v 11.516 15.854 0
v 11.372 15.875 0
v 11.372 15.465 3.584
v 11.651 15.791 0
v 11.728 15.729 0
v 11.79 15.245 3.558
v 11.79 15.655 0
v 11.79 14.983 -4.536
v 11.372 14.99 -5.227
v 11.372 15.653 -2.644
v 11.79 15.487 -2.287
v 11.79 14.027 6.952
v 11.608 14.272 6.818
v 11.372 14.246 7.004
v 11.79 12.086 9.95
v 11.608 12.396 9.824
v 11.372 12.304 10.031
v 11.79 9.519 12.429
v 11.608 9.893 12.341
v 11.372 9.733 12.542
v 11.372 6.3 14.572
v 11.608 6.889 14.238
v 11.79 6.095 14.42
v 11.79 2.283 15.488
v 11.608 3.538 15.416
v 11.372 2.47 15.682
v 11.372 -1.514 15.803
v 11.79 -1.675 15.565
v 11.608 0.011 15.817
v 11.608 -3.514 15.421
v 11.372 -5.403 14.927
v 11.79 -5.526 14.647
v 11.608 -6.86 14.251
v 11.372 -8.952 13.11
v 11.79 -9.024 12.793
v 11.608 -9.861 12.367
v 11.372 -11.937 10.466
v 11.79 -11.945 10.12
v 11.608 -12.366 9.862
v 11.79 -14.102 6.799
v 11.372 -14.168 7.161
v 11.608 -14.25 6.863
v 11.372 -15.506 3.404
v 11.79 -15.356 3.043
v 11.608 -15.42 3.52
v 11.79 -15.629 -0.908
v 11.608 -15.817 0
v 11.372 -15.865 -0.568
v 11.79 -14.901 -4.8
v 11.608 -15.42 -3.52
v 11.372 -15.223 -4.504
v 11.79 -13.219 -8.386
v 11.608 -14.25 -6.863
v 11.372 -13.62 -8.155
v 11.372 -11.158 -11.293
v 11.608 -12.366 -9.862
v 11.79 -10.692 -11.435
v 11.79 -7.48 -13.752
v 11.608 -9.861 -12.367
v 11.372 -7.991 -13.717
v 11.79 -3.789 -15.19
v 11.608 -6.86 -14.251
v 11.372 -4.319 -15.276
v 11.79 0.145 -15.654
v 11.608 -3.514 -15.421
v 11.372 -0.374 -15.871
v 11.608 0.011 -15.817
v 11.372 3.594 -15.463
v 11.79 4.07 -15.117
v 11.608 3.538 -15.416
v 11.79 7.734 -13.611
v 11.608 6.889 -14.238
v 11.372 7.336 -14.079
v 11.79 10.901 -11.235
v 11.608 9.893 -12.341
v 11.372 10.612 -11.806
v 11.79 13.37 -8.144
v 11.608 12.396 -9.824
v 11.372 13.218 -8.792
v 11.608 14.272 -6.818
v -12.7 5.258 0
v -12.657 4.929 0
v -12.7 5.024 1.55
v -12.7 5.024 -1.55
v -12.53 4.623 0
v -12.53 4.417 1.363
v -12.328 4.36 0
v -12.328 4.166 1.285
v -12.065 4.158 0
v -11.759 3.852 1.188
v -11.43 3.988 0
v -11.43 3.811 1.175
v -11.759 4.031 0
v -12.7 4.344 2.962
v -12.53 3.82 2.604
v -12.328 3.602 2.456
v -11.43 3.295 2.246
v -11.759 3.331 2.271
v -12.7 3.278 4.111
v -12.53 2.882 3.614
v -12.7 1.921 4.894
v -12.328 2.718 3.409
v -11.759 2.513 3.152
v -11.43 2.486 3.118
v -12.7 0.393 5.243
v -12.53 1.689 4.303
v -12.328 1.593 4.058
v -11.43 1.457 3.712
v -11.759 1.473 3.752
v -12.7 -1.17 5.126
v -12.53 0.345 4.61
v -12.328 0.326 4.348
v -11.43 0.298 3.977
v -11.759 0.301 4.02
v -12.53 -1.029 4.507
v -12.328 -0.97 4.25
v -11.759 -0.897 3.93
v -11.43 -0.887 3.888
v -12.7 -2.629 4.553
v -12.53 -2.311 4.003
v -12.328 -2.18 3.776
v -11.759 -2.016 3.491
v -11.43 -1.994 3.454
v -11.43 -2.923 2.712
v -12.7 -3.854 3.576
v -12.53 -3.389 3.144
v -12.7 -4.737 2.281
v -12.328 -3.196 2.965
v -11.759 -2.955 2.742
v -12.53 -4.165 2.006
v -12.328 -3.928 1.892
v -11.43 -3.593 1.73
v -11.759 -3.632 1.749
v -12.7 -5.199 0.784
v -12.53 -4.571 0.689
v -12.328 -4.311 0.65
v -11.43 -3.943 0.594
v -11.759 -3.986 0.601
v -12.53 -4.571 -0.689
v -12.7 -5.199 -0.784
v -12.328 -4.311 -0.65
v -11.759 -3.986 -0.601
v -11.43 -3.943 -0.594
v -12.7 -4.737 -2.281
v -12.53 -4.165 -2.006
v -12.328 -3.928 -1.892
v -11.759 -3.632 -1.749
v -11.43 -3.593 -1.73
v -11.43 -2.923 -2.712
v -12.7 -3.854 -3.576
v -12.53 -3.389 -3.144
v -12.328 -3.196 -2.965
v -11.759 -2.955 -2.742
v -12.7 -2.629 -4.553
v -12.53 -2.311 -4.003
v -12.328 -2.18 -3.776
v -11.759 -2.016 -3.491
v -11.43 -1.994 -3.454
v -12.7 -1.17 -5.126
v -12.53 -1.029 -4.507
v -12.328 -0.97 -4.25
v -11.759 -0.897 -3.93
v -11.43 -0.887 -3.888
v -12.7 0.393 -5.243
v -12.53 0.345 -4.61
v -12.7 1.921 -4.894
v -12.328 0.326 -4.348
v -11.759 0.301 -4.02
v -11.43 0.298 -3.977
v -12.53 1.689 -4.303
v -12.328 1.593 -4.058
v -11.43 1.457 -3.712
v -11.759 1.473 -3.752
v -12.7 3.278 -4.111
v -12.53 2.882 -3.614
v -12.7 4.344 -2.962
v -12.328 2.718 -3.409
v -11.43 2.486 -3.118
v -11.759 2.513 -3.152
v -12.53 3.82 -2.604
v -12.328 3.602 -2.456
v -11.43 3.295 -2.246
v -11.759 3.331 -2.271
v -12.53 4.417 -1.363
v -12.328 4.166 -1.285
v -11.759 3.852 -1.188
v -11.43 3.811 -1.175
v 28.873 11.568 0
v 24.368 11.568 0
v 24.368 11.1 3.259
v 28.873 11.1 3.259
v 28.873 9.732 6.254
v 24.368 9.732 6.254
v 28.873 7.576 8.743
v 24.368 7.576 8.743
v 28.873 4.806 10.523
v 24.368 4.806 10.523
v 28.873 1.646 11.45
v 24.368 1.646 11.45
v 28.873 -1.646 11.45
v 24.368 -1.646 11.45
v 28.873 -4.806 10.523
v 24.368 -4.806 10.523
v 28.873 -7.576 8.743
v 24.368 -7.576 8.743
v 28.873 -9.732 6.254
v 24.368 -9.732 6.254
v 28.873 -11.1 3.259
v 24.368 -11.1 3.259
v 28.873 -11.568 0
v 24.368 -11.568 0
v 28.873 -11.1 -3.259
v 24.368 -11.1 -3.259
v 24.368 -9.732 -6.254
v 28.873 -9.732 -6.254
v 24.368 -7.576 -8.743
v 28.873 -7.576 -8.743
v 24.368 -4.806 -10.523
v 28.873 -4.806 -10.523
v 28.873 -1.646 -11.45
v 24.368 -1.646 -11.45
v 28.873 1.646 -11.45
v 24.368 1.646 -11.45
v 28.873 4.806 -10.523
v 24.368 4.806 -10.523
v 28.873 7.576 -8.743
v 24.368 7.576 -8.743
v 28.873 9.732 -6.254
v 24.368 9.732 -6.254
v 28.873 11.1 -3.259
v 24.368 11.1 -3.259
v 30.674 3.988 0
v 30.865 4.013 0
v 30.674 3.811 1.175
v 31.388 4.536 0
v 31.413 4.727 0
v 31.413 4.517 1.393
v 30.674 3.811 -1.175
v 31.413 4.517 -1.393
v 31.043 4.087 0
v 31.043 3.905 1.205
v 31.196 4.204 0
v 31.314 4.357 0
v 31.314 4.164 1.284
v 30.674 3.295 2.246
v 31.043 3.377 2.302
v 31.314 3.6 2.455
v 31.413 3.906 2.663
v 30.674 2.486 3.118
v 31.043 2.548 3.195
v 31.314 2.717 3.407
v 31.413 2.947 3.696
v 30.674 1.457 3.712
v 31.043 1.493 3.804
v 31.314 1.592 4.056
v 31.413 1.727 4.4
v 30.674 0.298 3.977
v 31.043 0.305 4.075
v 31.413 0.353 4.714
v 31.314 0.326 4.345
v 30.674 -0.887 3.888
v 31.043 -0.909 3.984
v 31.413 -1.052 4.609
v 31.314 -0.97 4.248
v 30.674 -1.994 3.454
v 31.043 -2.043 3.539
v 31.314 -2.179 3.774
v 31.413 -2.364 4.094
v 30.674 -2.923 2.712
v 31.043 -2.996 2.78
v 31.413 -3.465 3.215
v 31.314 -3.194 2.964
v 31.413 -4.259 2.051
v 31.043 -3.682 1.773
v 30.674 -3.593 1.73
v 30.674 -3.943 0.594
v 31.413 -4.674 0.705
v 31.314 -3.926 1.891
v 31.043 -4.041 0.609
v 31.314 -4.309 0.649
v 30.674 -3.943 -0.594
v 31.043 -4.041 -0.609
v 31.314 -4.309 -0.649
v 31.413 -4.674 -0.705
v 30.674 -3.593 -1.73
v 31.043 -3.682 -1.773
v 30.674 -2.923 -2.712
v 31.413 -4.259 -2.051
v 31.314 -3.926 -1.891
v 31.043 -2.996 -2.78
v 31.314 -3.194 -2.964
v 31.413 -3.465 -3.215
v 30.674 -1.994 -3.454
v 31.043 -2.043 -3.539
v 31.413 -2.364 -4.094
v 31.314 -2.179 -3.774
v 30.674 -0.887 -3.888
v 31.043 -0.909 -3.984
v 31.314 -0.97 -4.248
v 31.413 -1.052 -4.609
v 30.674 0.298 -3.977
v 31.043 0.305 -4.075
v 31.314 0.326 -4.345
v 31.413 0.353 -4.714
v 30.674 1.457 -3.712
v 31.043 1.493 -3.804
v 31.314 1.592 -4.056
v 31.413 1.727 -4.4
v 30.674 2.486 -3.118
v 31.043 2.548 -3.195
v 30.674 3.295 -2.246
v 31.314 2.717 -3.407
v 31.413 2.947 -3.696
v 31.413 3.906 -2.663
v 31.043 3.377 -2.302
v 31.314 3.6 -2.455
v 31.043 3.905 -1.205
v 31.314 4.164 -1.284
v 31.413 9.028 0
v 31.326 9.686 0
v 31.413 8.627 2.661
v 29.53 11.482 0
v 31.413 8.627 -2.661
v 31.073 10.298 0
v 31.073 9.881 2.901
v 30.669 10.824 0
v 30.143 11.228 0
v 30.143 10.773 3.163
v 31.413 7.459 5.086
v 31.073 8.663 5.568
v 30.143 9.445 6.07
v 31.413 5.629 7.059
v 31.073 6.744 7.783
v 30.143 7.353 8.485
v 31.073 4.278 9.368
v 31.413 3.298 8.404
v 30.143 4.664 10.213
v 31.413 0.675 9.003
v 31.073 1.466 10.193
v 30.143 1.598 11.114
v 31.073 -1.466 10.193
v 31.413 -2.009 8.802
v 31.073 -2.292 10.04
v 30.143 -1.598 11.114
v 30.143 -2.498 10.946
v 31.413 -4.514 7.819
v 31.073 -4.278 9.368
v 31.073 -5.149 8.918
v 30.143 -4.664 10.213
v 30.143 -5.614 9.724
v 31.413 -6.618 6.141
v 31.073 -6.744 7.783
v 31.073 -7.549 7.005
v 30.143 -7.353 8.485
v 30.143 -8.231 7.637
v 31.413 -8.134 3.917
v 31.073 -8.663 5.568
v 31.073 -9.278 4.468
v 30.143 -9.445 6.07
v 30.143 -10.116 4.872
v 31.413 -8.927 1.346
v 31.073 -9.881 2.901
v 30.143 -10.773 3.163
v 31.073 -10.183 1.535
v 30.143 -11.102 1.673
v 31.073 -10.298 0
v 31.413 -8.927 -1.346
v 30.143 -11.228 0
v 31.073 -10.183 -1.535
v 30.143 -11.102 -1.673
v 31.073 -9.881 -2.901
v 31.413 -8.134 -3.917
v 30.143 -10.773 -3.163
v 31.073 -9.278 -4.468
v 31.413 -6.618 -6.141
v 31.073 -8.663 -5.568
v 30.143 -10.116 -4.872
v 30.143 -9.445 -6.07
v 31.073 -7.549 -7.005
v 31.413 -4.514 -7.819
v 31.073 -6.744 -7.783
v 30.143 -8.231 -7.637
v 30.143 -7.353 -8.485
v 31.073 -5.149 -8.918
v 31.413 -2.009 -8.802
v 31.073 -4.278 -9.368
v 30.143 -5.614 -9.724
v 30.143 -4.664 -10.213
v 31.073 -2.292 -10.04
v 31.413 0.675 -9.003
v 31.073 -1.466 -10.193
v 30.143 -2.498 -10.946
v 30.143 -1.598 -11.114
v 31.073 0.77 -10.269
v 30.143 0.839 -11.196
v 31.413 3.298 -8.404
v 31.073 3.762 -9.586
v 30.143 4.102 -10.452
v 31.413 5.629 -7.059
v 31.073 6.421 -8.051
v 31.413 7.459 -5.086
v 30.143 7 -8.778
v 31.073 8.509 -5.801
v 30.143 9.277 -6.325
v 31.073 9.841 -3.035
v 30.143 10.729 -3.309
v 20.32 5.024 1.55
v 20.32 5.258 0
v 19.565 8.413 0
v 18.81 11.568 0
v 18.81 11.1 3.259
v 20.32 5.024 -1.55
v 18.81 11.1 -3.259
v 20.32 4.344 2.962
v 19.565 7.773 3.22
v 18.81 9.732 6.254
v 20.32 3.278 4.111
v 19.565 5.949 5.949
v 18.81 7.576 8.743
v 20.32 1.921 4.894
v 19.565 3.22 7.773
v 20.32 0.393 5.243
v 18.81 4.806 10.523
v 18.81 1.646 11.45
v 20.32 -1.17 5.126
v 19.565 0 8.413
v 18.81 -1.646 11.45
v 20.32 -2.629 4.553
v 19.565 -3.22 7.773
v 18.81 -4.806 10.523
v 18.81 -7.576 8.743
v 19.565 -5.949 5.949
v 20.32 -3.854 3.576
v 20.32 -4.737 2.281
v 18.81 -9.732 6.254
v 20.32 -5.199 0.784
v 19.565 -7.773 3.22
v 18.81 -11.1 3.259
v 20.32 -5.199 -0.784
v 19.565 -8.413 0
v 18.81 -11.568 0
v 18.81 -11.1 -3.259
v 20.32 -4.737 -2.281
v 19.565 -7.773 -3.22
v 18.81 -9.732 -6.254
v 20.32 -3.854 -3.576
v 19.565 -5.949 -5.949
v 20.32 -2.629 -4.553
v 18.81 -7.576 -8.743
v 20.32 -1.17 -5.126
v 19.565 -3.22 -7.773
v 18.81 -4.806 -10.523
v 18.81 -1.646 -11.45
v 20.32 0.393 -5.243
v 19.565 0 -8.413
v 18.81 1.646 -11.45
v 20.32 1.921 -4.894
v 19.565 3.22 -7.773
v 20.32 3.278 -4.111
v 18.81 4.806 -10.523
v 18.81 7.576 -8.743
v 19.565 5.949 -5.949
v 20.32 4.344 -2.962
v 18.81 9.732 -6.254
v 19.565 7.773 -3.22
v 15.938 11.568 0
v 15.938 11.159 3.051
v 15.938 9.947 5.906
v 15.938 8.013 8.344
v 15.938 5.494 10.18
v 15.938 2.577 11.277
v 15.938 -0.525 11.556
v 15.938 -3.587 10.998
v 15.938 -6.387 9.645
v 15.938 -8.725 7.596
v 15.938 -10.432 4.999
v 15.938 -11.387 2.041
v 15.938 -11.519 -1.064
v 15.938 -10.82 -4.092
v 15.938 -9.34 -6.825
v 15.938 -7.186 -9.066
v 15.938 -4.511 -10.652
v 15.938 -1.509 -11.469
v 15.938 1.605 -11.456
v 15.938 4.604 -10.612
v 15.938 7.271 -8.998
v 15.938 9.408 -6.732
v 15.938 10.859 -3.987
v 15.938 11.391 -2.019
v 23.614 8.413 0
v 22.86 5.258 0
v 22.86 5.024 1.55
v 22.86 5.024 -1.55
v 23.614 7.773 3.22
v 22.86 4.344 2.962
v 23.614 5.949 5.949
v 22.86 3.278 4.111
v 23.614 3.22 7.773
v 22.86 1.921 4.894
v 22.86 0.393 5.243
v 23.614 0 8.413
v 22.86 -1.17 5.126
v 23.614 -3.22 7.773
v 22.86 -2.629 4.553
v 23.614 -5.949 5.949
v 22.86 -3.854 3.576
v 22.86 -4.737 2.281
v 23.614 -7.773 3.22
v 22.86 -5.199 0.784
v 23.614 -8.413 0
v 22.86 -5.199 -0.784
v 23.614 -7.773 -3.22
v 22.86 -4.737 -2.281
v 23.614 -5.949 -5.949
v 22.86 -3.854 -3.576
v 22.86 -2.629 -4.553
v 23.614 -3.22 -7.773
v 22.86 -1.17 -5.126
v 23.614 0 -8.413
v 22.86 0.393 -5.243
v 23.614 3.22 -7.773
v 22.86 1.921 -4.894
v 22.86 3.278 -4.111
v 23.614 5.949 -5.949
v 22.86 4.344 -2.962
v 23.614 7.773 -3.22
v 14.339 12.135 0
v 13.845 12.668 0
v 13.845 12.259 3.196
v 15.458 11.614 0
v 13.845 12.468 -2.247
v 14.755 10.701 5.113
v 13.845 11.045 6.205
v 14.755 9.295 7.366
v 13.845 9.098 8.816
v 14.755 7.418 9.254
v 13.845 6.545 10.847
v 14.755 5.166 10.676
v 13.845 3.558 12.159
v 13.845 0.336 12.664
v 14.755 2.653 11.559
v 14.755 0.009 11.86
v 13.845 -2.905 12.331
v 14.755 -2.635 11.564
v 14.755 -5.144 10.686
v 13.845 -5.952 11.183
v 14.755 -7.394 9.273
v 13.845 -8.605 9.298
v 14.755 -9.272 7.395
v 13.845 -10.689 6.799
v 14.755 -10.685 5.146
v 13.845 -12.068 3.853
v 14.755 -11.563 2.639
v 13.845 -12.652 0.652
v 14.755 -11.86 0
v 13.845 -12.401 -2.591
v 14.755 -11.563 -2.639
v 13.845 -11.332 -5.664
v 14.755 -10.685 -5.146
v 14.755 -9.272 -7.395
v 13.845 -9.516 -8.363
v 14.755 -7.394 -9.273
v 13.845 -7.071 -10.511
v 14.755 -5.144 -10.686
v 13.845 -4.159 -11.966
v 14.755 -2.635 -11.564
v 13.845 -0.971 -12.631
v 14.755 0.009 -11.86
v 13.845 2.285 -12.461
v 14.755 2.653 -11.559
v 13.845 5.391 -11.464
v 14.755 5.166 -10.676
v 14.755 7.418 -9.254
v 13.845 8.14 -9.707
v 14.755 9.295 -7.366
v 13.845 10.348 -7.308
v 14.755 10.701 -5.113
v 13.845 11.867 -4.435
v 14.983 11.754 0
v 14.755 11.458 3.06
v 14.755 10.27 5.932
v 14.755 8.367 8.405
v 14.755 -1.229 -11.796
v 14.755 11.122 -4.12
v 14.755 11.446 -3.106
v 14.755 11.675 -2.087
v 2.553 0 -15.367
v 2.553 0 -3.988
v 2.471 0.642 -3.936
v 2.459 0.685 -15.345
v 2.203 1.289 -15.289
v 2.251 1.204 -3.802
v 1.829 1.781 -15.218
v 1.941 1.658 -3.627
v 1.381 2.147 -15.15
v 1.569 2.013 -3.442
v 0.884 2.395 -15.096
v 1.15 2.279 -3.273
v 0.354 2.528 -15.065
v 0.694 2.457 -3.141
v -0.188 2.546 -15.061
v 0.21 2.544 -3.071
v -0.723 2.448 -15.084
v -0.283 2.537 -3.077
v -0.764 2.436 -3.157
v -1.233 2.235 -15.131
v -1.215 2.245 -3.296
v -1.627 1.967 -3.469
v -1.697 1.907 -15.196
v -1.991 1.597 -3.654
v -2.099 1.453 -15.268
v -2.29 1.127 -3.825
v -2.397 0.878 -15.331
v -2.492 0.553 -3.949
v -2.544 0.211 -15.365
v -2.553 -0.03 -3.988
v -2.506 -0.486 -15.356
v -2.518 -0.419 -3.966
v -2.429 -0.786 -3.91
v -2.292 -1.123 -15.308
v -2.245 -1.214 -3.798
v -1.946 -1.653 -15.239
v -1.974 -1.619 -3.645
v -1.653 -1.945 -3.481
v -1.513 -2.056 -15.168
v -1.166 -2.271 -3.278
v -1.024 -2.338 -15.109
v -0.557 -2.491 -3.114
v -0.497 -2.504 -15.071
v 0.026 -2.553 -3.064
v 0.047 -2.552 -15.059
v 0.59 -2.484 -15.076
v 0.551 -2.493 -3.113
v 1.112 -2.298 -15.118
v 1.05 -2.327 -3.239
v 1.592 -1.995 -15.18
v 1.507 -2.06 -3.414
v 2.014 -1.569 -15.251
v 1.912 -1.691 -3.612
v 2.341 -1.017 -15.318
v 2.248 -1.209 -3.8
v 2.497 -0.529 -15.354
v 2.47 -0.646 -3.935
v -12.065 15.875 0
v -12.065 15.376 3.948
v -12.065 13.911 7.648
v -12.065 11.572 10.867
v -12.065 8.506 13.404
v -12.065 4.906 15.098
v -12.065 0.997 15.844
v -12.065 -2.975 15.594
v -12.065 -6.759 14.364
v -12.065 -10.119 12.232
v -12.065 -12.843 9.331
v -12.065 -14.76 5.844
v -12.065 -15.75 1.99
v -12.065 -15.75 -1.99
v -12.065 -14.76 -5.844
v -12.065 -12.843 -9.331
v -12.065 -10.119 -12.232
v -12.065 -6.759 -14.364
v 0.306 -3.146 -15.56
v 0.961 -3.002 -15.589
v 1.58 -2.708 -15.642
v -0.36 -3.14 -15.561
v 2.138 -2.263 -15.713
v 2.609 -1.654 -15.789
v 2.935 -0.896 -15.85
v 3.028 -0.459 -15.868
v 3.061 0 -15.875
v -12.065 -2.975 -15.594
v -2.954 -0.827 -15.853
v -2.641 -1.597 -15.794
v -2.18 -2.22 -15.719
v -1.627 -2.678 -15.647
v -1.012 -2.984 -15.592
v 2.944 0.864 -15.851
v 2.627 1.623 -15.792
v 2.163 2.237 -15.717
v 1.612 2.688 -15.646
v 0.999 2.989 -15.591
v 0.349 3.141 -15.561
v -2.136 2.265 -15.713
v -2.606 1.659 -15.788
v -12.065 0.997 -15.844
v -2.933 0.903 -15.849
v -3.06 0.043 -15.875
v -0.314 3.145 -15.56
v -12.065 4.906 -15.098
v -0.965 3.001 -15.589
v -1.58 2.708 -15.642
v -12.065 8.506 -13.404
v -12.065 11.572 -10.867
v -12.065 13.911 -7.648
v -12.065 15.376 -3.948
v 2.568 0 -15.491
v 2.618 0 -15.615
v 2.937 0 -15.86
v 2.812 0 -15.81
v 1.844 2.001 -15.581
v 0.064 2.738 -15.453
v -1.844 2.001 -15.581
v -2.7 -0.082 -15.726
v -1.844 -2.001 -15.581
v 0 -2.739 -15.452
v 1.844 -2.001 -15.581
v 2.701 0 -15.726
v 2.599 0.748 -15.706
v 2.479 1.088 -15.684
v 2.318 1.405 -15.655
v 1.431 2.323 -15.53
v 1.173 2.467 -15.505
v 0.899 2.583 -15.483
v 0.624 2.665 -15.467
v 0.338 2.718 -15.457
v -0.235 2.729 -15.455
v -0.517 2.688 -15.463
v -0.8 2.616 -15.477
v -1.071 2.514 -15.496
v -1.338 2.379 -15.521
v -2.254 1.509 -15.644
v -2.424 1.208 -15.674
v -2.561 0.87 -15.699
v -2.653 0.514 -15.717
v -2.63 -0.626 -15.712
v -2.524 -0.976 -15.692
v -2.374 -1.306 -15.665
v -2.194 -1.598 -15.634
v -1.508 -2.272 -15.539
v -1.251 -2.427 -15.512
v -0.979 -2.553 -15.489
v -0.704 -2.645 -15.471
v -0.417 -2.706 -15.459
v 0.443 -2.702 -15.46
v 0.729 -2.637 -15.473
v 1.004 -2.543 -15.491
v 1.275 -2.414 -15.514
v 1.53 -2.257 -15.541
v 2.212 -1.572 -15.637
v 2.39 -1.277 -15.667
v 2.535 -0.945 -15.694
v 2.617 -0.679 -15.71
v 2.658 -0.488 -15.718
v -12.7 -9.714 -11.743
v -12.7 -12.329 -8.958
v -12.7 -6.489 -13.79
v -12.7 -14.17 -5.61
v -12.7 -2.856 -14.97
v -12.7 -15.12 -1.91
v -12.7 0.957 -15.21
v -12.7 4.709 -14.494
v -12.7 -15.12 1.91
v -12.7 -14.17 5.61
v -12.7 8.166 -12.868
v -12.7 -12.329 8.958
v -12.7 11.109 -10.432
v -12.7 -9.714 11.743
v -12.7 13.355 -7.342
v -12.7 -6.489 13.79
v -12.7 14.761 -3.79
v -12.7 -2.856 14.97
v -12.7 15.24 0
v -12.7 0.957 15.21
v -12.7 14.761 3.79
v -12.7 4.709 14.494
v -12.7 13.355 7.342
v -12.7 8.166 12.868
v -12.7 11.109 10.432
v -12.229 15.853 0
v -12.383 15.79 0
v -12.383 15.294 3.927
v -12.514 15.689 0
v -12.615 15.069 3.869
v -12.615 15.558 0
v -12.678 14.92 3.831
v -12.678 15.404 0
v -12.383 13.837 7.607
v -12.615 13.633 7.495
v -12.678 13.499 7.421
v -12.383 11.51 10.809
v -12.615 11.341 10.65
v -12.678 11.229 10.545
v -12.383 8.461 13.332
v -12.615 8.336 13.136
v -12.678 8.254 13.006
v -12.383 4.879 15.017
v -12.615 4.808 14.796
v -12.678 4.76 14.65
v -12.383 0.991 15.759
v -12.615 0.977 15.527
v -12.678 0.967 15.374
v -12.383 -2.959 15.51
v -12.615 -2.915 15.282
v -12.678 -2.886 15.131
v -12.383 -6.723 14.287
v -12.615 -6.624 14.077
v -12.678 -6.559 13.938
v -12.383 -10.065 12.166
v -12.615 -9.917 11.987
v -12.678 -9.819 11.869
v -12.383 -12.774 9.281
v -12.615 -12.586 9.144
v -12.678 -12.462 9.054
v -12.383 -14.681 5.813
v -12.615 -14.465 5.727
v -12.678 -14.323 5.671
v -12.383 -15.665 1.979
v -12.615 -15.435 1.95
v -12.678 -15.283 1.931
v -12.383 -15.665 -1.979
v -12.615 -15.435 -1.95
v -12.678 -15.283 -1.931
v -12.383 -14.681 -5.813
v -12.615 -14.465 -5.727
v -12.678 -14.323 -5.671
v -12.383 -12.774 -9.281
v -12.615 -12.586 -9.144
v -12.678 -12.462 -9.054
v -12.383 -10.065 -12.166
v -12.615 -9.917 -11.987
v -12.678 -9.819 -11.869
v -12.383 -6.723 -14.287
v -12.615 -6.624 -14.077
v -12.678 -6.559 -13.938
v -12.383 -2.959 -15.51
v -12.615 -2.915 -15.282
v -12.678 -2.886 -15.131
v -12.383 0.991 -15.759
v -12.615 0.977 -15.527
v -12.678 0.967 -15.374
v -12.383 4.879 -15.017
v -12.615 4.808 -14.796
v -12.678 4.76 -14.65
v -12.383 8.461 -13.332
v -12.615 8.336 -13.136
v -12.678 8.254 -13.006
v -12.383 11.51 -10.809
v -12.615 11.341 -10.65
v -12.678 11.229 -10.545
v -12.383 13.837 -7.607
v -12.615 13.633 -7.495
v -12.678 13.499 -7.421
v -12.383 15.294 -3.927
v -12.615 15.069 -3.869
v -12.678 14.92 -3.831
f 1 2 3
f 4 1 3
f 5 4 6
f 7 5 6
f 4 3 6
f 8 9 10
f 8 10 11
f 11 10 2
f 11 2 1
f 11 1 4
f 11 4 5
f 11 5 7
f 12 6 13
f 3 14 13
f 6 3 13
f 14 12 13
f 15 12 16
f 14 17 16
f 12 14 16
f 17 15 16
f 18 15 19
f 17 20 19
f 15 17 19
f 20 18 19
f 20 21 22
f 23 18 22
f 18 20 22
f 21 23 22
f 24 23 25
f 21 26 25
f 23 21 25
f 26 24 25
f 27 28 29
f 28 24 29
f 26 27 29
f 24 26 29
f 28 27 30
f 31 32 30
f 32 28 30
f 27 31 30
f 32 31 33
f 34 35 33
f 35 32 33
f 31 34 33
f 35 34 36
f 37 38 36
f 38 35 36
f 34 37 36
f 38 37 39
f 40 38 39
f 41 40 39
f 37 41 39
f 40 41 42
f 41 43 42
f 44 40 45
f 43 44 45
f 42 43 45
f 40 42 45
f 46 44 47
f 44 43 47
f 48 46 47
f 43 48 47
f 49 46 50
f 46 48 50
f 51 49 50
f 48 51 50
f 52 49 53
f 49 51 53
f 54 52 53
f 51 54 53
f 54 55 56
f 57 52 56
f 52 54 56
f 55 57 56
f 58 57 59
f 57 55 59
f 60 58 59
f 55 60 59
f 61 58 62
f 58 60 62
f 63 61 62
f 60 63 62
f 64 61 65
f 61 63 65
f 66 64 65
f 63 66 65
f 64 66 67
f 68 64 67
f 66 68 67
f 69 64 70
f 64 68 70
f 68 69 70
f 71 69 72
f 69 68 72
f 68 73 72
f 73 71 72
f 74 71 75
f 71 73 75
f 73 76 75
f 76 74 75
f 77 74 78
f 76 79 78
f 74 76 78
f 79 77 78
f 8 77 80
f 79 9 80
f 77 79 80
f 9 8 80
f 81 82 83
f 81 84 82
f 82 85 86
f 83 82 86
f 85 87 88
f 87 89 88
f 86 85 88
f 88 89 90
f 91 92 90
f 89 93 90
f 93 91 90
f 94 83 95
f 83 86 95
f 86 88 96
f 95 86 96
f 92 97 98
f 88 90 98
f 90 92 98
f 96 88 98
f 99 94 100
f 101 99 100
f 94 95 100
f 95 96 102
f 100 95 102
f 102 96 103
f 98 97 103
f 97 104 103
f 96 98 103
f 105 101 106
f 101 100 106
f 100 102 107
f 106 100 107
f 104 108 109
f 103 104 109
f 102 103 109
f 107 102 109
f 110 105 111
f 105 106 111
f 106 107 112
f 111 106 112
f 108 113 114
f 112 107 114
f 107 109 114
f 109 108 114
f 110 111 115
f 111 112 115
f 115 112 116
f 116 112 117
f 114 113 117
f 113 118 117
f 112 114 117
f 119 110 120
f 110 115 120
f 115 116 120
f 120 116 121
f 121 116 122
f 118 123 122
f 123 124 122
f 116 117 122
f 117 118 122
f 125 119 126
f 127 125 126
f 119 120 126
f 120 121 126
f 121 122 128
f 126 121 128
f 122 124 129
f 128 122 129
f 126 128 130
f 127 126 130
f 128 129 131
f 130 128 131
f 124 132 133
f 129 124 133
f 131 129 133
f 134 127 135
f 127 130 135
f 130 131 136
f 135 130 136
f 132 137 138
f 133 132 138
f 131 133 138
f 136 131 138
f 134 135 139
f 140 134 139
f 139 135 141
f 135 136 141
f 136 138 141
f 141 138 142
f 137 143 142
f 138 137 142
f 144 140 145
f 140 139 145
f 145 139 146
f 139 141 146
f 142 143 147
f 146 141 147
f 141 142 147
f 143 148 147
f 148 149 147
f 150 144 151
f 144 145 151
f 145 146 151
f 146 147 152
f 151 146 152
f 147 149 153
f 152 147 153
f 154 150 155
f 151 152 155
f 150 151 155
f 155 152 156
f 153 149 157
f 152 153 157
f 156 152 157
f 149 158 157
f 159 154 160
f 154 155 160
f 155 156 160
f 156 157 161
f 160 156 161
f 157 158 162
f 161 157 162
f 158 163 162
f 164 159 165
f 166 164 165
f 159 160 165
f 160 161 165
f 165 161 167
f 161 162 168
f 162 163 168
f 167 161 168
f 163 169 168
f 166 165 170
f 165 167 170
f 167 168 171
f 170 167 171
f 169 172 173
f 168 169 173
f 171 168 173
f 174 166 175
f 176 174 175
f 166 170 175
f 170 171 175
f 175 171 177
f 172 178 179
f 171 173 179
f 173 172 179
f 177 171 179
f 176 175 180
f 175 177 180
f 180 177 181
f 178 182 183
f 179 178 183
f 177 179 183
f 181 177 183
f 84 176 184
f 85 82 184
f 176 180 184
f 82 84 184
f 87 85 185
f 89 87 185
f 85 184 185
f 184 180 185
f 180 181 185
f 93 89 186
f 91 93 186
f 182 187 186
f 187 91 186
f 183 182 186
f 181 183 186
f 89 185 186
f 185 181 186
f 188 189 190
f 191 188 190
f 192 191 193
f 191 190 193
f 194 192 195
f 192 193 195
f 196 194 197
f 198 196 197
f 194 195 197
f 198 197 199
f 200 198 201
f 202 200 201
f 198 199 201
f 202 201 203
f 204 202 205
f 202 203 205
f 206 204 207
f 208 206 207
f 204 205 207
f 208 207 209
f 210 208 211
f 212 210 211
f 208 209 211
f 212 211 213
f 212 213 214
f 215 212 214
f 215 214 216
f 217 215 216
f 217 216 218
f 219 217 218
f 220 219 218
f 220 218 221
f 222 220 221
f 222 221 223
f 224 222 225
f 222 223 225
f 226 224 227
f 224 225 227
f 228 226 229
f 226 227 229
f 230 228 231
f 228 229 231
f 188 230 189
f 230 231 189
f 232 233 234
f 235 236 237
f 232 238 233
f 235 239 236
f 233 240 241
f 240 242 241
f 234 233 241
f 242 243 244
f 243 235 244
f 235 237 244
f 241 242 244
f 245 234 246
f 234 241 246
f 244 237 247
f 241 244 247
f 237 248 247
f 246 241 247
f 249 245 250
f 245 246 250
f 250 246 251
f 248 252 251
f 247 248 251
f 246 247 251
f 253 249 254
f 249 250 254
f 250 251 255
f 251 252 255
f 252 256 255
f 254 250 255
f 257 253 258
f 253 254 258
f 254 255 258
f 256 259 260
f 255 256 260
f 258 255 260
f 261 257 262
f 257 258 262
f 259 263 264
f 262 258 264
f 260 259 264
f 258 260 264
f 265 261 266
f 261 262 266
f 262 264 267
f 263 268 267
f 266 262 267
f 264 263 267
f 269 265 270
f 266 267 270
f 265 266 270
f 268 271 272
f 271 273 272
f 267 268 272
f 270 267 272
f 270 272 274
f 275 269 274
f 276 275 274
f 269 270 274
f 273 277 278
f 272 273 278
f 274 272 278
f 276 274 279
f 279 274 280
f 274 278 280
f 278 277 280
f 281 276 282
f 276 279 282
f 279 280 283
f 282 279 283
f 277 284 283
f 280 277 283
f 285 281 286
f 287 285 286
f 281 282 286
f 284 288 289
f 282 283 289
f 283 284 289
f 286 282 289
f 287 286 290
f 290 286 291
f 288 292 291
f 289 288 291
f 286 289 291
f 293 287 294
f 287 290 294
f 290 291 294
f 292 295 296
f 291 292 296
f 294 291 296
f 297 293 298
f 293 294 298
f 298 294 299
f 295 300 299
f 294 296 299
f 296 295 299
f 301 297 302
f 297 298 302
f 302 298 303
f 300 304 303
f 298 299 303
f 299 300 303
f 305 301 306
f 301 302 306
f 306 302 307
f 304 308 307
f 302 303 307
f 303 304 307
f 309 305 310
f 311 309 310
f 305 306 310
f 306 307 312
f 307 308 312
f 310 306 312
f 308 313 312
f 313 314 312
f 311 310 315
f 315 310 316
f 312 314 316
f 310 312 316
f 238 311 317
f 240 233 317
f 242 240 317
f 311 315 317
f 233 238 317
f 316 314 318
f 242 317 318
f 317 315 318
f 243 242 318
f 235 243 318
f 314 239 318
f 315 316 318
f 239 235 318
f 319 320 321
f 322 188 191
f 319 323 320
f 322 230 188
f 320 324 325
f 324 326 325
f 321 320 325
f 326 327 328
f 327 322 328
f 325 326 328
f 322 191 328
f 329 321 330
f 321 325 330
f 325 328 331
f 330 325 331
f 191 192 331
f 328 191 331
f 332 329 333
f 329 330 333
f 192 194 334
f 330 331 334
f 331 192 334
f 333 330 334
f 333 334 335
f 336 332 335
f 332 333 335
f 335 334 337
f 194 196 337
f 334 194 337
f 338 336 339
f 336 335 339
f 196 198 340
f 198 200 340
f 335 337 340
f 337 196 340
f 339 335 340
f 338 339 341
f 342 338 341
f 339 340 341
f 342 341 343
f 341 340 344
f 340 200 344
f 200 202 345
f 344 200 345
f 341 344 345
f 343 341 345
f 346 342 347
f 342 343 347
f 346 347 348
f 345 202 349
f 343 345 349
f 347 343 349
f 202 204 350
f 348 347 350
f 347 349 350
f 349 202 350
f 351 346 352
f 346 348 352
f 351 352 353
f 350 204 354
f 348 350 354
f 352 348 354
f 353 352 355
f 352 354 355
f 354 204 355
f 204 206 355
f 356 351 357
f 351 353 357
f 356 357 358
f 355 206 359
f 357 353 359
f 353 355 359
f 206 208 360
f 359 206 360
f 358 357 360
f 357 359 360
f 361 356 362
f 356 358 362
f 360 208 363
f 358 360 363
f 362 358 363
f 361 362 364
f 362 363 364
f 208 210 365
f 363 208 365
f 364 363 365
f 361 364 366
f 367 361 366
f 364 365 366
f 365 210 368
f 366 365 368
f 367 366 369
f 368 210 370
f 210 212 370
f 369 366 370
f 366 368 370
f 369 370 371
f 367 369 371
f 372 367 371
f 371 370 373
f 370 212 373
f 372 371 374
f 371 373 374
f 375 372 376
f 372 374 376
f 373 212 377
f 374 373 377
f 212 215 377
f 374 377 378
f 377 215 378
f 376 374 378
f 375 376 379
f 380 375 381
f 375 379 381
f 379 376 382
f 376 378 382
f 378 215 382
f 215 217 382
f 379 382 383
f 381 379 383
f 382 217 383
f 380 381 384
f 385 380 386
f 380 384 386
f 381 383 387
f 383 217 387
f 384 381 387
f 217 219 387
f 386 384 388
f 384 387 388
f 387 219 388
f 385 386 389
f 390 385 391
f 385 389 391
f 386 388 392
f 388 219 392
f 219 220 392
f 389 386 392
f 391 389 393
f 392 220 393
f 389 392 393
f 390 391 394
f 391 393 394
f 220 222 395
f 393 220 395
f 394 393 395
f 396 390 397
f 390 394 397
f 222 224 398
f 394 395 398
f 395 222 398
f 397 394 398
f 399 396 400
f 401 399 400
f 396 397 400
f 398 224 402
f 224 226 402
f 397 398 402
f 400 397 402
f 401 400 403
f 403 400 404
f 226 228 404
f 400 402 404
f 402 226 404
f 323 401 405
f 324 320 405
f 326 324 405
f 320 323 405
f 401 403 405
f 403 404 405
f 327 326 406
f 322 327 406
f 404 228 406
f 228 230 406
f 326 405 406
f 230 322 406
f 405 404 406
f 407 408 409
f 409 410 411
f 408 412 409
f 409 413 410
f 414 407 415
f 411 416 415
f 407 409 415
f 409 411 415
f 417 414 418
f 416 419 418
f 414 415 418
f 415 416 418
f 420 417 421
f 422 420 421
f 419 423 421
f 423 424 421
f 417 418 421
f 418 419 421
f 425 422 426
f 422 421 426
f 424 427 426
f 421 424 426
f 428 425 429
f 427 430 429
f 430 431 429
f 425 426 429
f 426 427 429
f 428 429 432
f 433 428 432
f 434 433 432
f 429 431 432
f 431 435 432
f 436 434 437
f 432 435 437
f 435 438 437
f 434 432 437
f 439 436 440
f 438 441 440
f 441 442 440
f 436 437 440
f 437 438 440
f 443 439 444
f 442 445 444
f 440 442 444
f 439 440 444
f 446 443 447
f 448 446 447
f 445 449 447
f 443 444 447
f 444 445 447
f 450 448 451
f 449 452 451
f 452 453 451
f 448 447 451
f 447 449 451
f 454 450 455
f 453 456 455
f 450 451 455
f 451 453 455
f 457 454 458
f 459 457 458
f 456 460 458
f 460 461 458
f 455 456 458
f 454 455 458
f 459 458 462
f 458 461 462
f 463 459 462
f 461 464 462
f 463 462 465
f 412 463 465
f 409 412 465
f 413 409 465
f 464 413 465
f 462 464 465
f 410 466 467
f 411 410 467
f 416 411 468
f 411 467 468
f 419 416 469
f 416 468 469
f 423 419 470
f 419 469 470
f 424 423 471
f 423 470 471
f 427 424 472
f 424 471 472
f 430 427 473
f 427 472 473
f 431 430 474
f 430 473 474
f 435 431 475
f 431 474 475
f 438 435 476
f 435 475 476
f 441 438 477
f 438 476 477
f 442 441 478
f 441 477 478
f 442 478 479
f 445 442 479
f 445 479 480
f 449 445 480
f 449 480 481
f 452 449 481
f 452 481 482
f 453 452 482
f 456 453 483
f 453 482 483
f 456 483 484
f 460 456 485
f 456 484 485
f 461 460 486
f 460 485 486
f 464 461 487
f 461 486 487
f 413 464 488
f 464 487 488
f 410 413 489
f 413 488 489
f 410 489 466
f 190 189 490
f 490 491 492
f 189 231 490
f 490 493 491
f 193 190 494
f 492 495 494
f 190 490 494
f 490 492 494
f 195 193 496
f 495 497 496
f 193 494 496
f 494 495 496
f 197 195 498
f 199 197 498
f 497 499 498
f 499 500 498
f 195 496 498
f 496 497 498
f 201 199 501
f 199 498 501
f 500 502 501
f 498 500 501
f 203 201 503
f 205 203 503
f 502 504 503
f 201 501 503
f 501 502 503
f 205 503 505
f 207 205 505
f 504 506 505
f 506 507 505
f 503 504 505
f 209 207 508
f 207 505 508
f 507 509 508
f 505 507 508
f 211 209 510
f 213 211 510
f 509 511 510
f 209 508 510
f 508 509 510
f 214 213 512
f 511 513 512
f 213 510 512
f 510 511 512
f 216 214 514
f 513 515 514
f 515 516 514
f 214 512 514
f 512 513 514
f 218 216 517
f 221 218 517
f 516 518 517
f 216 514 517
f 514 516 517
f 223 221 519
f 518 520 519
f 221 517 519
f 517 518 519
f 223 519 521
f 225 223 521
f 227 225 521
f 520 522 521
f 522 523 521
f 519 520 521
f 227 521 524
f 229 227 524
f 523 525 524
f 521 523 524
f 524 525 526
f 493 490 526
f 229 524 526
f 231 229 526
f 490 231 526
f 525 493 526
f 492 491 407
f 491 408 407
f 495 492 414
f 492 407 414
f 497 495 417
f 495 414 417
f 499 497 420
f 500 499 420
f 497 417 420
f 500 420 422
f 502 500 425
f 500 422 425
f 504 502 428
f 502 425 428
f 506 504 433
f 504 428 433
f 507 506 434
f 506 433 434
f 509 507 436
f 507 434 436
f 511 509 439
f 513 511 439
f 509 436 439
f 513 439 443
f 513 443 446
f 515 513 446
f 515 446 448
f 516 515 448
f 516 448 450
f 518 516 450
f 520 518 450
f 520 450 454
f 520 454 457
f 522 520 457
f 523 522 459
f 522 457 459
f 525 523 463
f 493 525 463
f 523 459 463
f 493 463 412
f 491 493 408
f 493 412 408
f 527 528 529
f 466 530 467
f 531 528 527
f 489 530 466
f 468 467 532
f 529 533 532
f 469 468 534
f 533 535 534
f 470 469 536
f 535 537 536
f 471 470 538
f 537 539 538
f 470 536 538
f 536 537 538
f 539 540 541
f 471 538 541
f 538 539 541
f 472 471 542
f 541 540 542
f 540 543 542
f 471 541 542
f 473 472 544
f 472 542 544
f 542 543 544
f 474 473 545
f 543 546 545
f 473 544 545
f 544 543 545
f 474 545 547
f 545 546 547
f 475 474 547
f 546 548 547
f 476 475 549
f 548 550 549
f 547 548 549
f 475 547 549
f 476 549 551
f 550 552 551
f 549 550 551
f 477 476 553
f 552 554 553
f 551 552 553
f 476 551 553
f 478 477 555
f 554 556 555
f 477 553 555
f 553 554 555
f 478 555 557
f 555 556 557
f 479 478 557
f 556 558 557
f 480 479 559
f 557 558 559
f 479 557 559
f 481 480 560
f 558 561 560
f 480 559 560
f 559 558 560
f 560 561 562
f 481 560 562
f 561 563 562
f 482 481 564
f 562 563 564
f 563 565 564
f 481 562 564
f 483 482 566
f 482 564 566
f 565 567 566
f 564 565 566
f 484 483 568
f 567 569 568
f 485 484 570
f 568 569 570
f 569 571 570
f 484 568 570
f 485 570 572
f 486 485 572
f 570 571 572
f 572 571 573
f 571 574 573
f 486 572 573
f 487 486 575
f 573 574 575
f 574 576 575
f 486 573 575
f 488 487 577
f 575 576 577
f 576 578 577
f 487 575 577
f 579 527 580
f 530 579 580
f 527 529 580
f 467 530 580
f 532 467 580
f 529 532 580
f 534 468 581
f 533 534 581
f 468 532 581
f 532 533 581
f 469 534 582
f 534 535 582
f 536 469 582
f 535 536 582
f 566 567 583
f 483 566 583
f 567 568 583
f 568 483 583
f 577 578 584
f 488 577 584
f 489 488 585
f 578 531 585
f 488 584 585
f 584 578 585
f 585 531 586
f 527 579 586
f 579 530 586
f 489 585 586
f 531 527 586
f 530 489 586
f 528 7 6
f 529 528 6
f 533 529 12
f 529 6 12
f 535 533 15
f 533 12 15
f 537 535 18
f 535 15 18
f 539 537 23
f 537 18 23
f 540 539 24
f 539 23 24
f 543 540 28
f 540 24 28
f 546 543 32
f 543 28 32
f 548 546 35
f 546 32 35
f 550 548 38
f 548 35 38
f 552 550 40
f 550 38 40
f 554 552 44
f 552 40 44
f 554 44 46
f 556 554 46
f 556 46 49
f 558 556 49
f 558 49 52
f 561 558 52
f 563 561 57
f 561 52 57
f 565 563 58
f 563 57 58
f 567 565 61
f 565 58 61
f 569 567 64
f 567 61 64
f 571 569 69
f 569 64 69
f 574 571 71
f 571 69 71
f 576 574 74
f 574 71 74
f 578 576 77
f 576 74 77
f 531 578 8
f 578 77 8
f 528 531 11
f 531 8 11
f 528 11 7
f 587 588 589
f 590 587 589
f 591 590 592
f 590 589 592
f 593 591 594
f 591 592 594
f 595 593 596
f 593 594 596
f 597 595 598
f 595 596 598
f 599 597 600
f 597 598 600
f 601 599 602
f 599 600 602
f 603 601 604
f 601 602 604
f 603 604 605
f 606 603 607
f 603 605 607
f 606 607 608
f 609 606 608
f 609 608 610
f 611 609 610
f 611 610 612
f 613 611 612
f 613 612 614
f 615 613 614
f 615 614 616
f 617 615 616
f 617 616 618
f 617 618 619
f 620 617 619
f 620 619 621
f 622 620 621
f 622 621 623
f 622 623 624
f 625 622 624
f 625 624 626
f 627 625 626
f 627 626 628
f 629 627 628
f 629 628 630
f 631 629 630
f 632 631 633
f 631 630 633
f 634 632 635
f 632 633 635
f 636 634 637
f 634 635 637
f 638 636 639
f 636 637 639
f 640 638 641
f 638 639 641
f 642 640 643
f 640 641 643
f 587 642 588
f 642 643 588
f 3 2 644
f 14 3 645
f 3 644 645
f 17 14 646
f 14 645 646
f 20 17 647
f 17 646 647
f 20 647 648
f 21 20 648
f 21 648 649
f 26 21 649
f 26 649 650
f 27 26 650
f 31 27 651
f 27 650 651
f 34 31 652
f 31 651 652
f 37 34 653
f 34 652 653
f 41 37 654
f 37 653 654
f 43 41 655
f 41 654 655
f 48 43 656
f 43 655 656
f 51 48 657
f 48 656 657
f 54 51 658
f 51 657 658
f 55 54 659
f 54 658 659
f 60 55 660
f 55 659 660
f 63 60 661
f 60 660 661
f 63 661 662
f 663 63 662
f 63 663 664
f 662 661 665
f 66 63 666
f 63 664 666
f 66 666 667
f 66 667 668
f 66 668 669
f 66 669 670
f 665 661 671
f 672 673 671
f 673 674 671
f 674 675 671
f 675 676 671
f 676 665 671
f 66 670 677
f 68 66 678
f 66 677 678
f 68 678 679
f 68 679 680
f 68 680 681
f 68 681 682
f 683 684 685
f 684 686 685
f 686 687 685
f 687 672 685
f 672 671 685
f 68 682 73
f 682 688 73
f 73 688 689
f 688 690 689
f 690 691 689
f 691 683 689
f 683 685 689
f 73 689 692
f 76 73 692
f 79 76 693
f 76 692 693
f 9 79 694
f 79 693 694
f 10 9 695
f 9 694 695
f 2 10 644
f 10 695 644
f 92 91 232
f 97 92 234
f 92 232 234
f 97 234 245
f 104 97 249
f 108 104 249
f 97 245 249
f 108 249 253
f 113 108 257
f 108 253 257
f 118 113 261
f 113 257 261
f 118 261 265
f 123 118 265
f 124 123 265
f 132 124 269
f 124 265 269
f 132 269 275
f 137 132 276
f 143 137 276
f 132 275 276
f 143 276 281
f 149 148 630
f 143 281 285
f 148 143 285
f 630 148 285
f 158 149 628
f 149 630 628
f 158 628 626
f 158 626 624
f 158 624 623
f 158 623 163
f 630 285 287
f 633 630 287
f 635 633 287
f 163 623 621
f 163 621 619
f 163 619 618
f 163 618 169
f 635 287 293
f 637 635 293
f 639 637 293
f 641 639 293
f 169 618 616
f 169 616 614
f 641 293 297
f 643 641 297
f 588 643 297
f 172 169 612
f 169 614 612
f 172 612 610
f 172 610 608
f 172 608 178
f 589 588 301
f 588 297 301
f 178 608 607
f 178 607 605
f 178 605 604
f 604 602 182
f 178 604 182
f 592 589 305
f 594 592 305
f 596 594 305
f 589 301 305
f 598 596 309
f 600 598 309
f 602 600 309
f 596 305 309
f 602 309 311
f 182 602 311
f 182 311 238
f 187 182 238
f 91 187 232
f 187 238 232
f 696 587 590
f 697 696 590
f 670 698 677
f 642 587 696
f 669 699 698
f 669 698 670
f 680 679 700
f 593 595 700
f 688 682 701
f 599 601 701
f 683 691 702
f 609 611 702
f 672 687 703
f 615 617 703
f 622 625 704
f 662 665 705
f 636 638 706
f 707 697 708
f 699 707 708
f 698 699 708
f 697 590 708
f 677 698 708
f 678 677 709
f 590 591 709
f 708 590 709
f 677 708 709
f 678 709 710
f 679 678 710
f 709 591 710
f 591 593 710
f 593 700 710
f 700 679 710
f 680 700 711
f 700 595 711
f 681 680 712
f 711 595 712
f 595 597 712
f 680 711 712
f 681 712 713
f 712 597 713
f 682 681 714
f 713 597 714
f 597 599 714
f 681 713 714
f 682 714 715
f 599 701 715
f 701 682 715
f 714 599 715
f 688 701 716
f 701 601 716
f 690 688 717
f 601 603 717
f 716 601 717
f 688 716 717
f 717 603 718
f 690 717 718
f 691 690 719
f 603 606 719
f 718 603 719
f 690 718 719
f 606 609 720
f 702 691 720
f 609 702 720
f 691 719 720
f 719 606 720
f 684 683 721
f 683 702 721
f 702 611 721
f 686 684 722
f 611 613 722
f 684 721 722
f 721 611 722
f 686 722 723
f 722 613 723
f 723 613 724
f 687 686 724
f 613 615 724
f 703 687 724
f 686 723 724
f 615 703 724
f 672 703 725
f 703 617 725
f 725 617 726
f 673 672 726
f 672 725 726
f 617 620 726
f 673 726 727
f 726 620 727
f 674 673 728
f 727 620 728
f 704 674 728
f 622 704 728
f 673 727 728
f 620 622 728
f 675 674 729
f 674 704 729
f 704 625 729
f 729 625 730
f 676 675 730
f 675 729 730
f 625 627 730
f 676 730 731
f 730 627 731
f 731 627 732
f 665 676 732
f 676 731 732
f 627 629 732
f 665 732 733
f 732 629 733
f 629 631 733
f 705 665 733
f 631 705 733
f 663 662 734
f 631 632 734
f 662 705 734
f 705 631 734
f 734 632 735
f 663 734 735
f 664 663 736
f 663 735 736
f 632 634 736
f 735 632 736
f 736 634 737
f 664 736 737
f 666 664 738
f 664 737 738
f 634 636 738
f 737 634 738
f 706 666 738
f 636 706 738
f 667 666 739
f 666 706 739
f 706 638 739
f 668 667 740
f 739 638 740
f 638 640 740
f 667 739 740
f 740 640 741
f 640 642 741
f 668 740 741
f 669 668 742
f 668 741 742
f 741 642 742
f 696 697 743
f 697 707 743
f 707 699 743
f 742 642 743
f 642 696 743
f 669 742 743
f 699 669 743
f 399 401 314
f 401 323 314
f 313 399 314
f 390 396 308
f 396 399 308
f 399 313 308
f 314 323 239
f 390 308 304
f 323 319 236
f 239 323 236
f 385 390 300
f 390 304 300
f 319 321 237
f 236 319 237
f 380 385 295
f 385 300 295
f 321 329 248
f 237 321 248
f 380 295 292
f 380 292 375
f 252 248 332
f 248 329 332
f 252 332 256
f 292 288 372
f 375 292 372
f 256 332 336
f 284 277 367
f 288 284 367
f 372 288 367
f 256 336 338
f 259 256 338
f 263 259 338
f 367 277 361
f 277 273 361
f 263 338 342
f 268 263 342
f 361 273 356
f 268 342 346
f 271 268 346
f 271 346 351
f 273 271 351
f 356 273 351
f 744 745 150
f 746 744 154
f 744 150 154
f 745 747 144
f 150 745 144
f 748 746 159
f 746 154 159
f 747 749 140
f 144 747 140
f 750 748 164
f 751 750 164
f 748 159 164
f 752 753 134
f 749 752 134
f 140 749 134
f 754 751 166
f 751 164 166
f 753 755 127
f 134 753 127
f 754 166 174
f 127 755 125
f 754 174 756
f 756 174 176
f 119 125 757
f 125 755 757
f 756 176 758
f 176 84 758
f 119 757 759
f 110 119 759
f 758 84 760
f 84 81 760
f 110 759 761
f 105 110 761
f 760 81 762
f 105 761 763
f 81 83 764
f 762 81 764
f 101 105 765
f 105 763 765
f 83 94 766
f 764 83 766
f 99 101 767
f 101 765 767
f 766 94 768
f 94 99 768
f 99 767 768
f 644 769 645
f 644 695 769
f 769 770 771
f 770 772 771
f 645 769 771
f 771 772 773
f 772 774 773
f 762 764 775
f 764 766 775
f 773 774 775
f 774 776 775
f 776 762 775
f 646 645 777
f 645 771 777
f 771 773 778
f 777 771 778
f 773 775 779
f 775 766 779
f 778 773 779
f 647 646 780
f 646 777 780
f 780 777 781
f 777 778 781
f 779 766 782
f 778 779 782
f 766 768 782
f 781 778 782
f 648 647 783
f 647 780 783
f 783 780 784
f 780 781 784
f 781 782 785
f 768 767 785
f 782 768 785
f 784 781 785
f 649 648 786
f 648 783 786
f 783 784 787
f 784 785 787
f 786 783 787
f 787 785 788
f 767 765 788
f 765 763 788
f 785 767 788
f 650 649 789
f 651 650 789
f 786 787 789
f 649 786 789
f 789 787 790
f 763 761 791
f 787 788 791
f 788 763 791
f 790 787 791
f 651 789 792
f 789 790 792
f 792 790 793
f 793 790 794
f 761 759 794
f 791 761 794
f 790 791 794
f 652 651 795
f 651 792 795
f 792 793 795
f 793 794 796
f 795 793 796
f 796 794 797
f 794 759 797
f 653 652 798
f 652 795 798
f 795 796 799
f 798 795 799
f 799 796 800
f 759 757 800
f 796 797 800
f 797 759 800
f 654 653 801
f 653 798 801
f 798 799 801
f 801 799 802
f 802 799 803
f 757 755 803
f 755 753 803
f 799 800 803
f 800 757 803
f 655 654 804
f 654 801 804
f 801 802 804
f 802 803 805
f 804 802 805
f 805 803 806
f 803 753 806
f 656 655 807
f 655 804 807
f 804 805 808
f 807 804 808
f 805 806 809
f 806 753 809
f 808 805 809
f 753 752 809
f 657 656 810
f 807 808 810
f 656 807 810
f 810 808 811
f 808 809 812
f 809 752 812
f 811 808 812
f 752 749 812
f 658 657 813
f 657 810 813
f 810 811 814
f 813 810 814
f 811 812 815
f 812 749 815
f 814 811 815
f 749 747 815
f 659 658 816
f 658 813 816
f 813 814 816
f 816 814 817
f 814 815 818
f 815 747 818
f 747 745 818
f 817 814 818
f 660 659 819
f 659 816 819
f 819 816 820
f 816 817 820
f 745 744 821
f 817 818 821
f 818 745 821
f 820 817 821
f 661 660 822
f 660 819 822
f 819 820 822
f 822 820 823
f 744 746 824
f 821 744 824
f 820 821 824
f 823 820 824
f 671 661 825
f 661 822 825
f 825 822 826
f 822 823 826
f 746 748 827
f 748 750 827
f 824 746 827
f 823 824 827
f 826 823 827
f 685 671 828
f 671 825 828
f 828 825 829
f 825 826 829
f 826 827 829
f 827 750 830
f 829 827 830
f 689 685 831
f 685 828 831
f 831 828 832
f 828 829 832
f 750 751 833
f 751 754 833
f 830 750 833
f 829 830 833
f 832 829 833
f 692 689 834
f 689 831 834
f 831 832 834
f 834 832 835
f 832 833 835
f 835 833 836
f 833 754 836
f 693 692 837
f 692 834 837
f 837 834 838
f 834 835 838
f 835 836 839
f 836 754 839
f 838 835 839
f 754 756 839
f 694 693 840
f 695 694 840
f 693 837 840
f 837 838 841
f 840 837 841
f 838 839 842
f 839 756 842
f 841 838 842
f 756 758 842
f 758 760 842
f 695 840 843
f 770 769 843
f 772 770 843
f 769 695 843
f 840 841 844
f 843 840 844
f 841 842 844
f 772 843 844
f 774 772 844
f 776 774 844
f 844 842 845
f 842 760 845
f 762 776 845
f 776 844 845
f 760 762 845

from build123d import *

# Parameters (mm, degrees)
F2_R     = 2.5527
F3_DEPTH = 25.4
F4_R     = 0.508
F5_R     = 2.54


# Not quite as in the source:
# - a feature names something its author has since deleted; it is built from what else it names


with BuildPart() as f1:
    # F0 (on Top) → F1 (revolve)
    with BuildSketch(Plane.XY):
        with BuildLine():
            ThreePointArc((-12.7, 5.2578), (-12.3280256121, 4.3597743879), (-11.43, 3.9878))
            Line((-11.43, 3.9878), (21.59, 3.9878))
            Line((21.59, 3.9878), (30.6736943138, 3.9878))
            ThreePointArc((30.6736943138, 3.9878), (31.1964370123, 4.2043271153), (31.4129641276, 4.7270698138))
            Line((31.4129641276, 4.7270698138), (31.4129641276, 11.2707641276))
            Line((31.4129641276, 11.2707641276), (31.4129641276, 11.5681612351))
            Line((31.4129641276, 11.5681612351), (24.3683144, 11.5681612351))
            Line((24.3683144, 11.5681612351), (22.86, 5.2578))
            Line((22.86, 5.2578), (21.59, 5.2578))
            Line((21.59, 5.2578), (20.32, 5.2578))
            Line((20.32, 5.2578), (18.8103442021, 11.5681612351))
            Line((18.8103442021, 11.5681612351), (14.6019718679, 11.5681612351))
            Line((14.6019718679, 11.5681612351), (11.638822034, 15.875))
            Line((11.638822034, 15.875), (-12.065, 15.875))
            ThreePointArc((-12.065, 15.875), (-12.5140128061, 15.6890128061), (-12.7, 15.24))
            Line((-12.7, 15.24), (-12.7, 5.2578))
        make_face()
    revolve(axis=Axis((0.6358246983, 0, 0), (1, 0, 0)))

    # F2 (on Top) → F3 (cut)
    with BuildSketch(Plane.XY):
        Circle(F2_R)
    extrude(amount=-F3_DEPTH, mode=Mode.SUBTRACT)

    # F4
    f4_edges = [f1.edges().sort_by_distance(p)[0] for p in [
        (-0.213089, 15.875, 0),
        (-12.065, -15.875, 0),
        (11.638822, -15.875, 0),
        (-2.5527, 0, -15.875),
    ]]
    fillet(f4_edges, radius=F4_R)

    # F5
    f5_edges = [f1.edges().sort_by_distance(p)[0] for p in [
        (31.412964, -11.568161, 0),
        (14.601972, -11.568161, 0),
    ]]
    fillet(f5_edges, radius=F5_R)


solid = f1.part
